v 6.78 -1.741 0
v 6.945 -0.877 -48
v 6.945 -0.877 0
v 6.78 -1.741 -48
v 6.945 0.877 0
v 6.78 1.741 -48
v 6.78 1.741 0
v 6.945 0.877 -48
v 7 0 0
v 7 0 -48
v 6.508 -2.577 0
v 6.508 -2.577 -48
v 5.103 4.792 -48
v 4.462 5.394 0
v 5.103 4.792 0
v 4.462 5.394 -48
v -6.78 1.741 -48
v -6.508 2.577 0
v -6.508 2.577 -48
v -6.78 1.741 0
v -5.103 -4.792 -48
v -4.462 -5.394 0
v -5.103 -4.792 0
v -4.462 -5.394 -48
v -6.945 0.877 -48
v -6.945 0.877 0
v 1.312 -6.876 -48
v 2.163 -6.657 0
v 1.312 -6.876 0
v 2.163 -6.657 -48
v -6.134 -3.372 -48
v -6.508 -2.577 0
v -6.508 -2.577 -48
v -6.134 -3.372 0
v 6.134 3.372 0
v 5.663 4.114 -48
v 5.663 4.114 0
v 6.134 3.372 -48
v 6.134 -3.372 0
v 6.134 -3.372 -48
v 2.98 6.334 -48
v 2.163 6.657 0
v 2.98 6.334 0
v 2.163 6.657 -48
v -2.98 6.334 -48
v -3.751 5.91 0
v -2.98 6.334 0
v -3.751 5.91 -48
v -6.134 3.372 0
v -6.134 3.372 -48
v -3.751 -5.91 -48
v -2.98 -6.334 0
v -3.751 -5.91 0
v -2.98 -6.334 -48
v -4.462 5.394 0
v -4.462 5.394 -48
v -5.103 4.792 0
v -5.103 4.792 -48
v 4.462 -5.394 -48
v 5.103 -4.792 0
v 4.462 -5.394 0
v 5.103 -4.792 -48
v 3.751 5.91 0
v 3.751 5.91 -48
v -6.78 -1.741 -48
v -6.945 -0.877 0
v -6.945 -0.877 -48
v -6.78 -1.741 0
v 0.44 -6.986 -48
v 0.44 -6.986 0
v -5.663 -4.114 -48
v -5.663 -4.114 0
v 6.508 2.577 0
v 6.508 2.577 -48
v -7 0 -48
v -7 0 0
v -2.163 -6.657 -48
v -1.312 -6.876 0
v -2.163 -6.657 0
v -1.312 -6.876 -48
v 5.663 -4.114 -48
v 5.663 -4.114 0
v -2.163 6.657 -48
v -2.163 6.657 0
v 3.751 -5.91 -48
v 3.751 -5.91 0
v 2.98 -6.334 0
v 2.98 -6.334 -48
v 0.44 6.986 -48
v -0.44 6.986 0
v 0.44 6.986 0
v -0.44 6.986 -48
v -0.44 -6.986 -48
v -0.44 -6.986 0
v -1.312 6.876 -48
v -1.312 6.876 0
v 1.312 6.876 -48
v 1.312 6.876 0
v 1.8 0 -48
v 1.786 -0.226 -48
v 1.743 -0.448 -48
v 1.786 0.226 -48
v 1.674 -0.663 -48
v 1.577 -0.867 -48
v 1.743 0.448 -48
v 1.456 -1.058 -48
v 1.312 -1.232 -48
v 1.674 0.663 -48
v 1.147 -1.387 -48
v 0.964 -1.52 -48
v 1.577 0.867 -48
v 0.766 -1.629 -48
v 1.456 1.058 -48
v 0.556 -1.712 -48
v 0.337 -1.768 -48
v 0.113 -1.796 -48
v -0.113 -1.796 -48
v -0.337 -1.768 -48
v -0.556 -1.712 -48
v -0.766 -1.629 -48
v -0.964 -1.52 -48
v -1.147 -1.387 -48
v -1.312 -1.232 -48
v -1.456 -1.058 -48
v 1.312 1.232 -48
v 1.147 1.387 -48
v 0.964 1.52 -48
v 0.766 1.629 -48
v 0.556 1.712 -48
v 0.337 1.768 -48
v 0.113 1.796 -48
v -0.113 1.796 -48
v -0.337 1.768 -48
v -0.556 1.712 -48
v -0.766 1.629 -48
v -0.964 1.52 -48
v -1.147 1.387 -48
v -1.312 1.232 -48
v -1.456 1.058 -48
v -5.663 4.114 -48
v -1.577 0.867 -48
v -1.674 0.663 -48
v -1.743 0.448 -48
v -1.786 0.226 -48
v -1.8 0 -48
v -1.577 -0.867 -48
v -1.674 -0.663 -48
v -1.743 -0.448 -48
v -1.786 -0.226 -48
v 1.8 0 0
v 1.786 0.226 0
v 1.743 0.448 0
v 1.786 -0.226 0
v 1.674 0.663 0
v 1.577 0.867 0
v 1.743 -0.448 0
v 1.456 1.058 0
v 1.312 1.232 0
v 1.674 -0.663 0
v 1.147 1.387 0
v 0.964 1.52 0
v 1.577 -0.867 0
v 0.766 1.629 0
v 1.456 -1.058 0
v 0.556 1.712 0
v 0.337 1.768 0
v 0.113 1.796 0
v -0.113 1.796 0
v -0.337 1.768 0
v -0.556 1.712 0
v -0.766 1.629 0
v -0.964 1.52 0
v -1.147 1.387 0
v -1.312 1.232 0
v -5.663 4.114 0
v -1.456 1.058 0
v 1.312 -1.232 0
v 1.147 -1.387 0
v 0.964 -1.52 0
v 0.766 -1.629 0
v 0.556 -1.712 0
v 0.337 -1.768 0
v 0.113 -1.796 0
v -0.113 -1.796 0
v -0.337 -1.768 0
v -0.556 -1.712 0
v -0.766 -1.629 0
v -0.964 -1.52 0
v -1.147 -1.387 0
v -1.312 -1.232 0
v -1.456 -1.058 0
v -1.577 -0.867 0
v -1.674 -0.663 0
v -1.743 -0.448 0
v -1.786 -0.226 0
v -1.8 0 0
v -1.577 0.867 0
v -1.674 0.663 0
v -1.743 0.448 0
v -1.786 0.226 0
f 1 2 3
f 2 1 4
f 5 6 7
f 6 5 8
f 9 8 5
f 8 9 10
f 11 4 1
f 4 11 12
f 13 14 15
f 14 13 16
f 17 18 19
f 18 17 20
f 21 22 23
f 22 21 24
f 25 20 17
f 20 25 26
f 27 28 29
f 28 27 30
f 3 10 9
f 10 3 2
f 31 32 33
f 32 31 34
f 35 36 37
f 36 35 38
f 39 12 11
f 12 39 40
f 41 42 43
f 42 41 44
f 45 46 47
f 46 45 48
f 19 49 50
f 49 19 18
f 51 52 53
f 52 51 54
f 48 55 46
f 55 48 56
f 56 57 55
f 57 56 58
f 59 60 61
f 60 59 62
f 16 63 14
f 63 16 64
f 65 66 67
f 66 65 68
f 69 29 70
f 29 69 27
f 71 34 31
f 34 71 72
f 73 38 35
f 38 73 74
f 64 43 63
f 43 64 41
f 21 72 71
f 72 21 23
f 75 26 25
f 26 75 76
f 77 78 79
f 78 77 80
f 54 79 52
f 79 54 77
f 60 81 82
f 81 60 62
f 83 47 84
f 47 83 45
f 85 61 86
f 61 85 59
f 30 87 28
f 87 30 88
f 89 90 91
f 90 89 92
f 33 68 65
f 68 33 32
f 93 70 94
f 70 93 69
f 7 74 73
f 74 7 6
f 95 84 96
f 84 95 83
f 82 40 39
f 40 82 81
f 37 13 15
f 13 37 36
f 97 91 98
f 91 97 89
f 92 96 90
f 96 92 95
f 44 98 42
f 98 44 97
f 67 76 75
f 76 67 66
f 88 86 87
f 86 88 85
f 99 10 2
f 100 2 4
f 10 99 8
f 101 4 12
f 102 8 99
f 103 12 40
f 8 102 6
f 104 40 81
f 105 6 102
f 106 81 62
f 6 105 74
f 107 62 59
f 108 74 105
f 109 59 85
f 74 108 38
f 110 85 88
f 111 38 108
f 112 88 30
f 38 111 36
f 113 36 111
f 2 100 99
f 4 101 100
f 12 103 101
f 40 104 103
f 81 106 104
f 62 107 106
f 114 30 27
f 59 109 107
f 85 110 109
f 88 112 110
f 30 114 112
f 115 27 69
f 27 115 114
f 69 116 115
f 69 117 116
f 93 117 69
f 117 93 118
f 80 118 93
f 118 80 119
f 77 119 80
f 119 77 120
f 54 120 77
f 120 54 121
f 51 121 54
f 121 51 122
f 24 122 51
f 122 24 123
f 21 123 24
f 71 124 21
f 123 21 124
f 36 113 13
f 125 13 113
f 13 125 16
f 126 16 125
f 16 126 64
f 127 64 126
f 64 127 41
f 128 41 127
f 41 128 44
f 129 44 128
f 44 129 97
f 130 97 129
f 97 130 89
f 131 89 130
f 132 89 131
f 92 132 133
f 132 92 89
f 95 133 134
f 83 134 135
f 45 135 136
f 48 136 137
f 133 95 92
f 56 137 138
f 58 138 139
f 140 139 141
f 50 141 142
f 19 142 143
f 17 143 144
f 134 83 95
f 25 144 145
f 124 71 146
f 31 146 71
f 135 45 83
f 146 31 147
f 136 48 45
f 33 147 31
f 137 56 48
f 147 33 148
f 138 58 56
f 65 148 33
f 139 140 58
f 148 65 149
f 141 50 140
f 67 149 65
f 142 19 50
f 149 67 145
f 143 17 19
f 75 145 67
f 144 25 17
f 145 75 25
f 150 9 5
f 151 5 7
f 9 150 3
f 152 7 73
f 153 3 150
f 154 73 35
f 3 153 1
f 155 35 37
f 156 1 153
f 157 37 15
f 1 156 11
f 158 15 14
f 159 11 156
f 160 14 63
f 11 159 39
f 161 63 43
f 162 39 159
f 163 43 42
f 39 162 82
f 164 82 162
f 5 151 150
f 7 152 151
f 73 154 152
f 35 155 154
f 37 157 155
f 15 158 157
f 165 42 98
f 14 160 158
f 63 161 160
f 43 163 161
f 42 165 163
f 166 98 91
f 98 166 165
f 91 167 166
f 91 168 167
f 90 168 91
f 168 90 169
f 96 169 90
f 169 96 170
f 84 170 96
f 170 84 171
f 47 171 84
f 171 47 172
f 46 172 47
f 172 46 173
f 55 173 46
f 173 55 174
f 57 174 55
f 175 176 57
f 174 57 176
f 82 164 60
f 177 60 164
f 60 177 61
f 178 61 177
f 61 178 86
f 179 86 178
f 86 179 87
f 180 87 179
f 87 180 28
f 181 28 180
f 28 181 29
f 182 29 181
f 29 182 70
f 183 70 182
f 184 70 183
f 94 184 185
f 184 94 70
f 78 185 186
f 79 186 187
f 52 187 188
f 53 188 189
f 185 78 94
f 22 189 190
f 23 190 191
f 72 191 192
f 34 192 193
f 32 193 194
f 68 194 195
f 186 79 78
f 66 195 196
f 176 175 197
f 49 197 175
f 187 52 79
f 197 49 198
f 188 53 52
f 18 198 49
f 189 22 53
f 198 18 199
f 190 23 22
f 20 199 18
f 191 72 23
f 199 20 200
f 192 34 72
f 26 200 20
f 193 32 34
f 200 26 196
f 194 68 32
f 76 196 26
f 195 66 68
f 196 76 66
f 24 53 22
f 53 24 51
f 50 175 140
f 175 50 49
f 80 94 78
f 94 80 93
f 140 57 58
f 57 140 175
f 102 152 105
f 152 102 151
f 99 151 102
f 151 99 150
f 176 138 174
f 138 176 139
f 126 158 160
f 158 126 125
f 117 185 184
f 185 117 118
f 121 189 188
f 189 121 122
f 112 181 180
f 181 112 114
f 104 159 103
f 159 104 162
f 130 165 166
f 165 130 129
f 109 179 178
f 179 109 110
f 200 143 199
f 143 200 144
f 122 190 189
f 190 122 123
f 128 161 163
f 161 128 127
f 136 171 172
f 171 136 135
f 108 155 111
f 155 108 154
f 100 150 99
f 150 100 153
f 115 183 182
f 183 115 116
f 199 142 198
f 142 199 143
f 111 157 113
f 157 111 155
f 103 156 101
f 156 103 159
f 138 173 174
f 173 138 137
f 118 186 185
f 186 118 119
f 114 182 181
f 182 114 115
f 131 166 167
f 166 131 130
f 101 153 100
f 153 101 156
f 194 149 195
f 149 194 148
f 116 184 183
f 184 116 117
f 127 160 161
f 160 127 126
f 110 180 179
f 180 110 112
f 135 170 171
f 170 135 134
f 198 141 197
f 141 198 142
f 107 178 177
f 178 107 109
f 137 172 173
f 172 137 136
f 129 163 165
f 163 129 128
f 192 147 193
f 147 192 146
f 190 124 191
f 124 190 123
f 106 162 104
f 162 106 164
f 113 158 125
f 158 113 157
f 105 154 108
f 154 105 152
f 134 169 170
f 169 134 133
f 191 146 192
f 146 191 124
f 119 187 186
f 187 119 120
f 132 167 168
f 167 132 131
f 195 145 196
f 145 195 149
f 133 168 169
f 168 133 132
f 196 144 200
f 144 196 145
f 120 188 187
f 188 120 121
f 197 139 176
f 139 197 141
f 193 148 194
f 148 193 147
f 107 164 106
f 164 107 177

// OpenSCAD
$fn = 50;


difference() {
	union() {
		translate(v = [0, 0, -48.0000000000]) {
			cylinder(h = 48, r = 7.0000000000);
		}
		cylinder(h = 0, r = 16.0000000000);
	}
	union() {
		#translate(v = [0, 0, -48]) {
			cylinder(h = 48, r = 1.8000000000);
		}
	}
}
